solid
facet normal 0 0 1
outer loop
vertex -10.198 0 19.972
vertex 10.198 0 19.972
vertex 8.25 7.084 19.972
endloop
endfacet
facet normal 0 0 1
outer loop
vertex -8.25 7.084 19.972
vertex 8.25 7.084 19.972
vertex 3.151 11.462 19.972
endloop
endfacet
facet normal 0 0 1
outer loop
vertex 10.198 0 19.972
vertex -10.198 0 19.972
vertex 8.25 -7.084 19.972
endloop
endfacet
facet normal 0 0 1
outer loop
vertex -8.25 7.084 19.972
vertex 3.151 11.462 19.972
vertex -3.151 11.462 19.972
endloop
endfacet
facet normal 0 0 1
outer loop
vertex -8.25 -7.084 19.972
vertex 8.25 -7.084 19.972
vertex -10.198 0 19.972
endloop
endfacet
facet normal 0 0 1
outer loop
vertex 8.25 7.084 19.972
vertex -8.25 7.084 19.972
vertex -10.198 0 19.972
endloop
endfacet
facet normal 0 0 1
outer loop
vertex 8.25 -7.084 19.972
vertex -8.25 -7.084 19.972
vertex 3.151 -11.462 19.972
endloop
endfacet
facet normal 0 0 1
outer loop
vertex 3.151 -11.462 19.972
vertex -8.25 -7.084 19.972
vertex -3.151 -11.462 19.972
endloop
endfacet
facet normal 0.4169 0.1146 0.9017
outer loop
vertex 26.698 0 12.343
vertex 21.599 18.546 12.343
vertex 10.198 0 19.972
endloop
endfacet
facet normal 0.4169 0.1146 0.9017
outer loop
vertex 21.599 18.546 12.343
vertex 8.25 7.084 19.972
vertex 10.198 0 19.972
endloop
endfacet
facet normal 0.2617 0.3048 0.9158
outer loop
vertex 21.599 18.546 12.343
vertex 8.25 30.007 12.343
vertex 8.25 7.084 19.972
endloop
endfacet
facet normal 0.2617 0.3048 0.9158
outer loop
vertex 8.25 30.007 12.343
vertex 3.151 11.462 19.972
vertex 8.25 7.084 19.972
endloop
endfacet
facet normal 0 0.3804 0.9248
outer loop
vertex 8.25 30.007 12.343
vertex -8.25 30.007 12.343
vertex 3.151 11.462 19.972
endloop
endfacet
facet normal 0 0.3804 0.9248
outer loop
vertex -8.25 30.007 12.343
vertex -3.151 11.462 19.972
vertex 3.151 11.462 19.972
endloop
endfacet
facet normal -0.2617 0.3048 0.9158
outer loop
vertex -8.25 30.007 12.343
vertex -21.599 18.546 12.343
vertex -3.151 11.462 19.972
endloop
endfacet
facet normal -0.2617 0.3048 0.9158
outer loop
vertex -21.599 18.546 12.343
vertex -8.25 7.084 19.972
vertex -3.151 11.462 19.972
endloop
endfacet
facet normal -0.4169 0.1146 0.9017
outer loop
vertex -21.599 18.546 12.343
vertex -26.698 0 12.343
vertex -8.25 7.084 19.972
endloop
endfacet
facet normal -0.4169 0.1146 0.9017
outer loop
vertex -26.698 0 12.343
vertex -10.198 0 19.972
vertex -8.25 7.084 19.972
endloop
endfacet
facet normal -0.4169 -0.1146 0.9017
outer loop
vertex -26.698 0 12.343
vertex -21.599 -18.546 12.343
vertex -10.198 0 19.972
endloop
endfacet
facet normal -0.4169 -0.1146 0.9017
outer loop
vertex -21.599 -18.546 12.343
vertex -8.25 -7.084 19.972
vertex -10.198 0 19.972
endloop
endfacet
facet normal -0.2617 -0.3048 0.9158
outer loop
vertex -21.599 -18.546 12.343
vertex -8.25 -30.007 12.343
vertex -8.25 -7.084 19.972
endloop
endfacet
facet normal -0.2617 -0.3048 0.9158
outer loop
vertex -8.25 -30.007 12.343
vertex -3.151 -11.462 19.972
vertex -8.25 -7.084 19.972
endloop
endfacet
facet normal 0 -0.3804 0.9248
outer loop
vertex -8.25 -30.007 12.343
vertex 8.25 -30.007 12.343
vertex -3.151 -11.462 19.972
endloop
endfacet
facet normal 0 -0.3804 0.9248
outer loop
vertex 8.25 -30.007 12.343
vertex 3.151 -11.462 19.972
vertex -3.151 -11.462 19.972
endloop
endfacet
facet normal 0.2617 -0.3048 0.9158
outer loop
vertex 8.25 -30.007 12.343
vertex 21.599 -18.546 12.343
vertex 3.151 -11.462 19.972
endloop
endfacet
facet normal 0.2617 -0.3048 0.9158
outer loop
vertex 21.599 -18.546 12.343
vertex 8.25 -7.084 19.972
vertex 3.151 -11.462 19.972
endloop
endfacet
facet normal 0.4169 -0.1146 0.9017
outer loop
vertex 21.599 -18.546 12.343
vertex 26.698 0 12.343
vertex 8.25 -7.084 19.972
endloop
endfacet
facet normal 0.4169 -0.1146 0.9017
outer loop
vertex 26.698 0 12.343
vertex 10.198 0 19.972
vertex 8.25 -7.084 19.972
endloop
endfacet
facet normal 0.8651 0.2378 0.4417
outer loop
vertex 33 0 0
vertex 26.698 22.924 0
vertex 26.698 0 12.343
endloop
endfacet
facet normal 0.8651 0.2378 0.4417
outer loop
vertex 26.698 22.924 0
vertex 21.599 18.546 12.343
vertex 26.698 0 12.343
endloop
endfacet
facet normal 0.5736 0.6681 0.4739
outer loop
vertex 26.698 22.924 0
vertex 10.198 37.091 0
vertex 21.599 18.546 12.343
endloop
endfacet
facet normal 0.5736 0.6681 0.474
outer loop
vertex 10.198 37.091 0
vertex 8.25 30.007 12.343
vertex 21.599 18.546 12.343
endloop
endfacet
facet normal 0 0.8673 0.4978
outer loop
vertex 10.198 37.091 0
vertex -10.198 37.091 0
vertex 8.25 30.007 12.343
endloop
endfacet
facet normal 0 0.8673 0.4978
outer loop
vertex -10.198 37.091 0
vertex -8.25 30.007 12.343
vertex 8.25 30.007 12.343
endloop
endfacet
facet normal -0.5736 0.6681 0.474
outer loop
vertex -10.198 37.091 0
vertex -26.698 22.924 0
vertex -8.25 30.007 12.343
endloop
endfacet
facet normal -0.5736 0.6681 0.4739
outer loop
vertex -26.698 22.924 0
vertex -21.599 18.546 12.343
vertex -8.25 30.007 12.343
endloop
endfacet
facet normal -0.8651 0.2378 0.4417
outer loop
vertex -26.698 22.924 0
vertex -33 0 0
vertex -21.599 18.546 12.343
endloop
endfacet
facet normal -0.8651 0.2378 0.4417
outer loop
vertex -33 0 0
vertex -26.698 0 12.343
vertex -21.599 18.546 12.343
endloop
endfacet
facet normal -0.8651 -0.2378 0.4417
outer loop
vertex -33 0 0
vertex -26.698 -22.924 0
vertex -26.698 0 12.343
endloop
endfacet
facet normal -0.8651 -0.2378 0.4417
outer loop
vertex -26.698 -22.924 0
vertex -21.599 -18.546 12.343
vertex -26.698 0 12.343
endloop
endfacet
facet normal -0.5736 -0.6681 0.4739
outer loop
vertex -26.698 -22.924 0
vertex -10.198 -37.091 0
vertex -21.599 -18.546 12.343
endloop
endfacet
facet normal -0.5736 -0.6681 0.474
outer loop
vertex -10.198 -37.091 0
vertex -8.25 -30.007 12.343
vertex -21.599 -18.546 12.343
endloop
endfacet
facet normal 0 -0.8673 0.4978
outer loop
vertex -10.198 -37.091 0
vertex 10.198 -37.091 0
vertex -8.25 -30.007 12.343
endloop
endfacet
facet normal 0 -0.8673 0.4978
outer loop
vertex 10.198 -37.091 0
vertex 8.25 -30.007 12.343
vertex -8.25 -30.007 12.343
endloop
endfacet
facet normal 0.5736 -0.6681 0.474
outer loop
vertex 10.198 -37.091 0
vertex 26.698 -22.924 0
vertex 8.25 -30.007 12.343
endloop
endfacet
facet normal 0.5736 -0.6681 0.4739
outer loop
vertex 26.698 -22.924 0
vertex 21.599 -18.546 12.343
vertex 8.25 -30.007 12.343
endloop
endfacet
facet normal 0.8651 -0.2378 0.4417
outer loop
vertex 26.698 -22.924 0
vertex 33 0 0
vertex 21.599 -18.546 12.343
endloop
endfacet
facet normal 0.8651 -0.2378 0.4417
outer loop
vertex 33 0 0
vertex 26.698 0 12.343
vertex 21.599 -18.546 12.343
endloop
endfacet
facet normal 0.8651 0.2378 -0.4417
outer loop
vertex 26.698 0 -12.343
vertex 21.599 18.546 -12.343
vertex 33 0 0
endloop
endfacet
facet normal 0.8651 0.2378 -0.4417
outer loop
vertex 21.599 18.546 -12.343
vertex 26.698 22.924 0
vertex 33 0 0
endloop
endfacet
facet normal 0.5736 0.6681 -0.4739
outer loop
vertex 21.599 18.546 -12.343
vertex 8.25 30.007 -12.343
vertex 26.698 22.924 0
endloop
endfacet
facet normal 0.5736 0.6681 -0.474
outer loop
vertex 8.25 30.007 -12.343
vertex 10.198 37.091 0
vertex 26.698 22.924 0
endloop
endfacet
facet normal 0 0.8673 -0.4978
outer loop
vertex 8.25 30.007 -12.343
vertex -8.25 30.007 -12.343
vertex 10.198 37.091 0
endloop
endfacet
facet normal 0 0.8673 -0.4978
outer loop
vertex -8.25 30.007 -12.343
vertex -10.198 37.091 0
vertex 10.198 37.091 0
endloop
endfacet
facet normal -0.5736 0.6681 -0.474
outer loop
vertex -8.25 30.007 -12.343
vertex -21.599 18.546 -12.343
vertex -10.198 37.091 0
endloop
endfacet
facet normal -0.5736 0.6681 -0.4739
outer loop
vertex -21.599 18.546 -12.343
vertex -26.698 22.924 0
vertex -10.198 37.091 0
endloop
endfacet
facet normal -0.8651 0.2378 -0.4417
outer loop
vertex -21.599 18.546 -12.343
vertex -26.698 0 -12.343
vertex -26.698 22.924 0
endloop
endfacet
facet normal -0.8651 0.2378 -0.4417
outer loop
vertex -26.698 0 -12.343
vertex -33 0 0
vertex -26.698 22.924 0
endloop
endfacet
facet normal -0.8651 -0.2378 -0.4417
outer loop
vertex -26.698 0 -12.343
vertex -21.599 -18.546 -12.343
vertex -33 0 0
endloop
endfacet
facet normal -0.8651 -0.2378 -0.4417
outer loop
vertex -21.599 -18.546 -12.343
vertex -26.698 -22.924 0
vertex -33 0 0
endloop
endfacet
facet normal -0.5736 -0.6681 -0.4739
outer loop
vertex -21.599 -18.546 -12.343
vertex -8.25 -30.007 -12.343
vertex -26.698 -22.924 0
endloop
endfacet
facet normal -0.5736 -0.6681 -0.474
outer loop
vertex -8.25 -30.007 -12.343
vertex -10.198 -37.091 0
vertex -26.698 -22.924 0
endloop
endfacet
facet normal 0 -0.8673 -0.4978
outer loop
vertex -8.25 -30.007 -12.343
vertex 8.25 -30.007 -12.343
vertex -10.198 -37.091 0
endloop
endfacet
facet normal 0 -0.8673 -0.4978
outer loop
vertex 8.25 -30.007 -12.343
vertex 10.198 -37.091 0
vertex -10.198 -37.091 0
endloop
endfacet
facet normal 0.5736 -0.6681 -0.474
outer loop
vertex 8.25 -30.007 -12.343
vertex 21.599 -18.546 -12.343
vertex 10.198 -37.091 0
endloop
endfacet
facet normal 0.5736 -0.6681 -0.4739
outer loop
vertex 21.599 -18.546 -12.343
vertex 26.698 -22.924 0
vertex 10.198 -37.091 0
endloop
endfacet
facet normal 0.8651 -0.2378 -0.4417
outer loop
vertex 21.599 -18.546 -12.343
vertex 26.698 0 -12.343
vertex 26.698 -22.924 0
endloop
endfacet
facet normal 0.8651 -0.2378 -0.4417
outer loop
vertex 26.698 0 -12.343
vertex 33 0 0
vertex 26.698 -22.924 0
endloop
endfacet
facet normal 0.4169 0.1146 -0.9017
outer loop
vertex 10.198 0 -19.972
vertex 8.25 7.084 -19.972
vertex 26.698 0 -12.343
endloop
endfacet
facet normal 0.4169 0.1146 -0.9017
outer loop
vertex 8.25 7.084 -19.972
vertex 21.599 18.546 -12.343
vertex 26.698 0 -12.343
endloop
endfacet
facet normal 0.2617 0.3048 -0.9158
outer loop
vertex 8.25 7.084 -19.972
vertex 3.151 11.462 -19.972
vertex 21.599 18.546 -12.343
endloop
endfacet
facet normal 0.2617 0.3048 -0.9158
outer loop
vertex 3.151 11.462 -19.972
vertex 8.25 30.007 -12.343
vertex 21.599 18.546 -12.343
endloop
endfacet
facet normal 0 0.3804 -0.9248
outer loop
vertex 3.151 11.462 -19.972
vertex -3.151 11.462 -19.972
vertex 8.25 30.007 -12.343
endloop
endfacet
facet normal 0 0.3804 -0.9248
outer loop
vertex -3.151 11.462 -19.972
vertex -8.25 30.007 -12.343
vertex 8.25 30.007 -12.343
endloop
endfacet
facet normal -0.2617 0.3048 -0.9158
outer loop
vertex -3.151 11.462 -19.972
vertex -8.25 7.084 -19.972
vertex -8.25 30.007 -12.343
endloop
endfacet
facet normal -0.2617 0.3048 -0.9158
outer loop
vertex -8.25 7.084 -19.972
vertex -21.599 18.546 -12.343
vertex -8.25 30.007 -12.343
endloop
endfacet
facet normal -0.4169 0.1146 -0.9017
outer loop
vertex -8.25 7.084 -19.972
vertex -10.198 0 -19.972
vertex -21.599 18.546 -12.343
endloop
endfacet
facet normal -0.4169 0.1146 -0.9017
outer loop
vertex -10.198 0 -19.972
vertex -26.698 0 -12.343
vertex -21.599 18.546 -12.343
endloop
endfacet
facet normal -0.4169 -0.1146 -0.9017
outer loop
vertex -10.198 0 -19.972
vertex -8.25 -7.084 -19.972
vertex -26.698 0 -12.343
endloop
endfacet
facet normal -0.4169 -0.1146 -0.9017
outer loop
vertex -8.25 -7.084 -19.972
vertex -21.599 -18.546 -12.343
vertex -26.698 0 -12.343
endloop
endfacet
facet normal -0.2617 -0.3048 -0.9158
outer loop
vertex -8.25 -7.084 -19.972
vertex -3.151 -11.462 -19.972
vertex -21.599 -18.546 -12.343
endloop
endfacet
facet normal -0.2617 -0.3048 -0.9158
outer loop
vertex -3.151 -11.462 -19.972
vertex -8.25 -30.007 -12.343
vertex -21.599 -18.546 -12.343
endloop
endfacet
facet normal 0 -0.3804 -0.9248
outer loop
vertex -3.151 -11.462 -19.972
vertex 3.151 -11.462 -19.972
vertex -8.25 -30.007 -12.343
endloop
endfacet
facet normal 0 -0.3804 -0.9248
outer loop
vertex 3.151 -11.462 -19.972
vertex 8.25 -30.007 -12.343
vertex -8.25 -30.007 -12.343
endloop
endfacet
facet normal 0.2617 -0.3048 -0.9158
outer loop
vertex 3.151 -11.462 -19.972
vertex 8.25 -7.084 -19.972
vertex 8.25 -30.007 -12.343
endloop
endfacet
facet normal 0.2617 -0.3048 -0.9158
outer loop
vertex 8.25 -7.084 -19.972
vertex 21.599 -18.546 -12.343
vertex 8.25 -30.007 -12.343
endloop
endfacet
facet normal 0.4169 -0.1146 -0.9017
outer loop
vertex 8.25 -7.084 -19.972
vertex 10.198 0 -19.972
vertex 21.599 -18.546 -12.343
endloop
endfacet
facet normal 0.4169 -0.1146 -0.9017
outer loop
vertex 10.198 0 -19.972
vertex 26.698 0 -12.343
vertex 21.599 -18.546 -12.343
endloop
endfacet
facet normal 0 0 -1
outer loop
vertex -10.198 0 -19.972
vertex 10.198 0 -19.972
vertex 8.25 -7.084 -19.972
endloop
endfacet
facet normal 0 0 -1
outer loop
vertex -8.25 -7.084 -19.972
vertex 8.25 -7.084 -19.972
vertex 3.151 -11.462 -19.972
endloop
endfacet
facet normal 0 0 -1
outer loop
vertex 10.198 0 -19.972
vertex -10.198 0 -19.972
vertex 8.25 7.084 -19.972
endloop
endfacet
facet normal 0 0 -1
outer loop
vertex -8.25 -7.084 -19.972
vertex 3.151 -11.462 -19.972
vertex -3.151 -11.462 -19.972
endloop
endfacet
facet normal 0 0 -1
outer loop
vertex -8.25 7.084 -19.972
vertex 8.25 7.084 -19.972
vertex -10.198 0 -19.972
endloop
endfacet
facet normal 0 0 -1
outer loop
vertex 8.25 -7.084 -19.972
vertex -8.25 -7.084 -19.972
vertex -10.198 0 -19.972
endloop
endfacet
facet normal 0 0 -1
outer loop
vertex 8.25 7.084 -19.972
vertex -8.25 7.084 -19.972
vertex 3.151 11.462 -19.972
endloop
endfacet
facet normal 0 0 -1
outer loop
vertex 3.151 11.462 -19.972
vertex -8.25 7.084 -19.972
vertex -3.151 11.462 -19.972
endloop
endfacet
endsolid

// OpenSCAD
// Generated by SolidPython 1.0.1 on 2020-07-29 00:46:49


scale(v = [11, 13, 7]) {
	sphere(r = 3);
}
/***********************************************
*********      SolidPython code:      **********
************************************************
 
# import packages: SolidPython
from solid import *
from solid.utils import *
from itertools import chain, combinations, permutations


class Resize:

    def __init__(self, scad_file):
        self.scad_file = scad_file
        #self.scad_file = import_scad(scad_file)
        # cone/cylinder param:
        self.r1 = 0
        self.r2 = 0
        self.h = 0
        # rectangular prism param:
        self.w = 0
        self.l = 0
        # ellipse param:
        self.r = 0

    # import OpenScad code (file name corresponds to shape)


    # classify shape + parameters
    def assign(self, param1, param2, param3):
        if self.scad_file == 'cone.scad':
            self.r1 = param1
            self.r2 = param2
            self.h = param3
        elif self.scad_file == 'cylinder.scad':
            self.r1 = param1
            self.r2 = param2
            self.h = param3
        elif self.scad_file == 'rectangularPrism.scad':
            self.h = param1
            self.l = param2
            self.w = param3
        else:
            self.r = param1
            self.h = param2

    # resize parameters
    def iterate(self):
        x = range(3, 20, 2)
        i = 1
        if self.scad_file == 'cone.scad':
            tempList = list(permutations(x, 2))
            for temp in tempList:
                param1 = temp[0]
                param2 = temp[1]
                filepath = 'produced_scad_files/' + 'cone' + str(param1) + '_' + str(param2) + '_' + '.scad'
                scad_render_to_file(cylinder(h=param1, r1=param2, r2=0), filepath)

        elif self.scad_file == 'cylinder.scad':
            tempList = list(permutations(x, 3))
            for temp in tempList:
                param1 = temp[0]
                param2 = temp[1]
                filepath = 'produced_scad_files/' + 'cylinder' + str(param1) + '_' + str(param2) + '_' + '.scad'
                scad_render_to_file(cylinder(h=param1, r1=param2, r2=param2), filepath)

        elif self.scad_file == 'rectangularPrism.scad':
            tempList = list(permutations(x, 3))
            for temp in tempList:
                param1 = temp[0]
                param2 = temp[1]
                param3 = temp[2]
                filepath = 'produced_scad_files/' + 'rectangularPrism' + str(param1) + '_' + str(param2) + '_' + str(
                    param3) + '.scad'
                scad_render_to_file(cube(size=(param1, param2, param3)), filepath)

        elif self.scad_file == 'ellipse.scad':
            tempList = list(permutations(x, 4))
            for temp in tempList:
                param1 = temp[0]
                param2 = temp[1]
                param3 = temp[2]
                param4 = temp[3]
                filepath = 'produced_scad_files/' + 'ellipse' + str(param1) + '_' + str(param2) + '_' + str(param3) + '_' + str(param4) + '.scad'
                scad_render_to_file(scale([param1, param2, param3])(sphere(r=param4)), filepath)

    def render_to_scadfile(self):
        scad_render_to_file(scad, 'example.scad') 
 
************************************************/
